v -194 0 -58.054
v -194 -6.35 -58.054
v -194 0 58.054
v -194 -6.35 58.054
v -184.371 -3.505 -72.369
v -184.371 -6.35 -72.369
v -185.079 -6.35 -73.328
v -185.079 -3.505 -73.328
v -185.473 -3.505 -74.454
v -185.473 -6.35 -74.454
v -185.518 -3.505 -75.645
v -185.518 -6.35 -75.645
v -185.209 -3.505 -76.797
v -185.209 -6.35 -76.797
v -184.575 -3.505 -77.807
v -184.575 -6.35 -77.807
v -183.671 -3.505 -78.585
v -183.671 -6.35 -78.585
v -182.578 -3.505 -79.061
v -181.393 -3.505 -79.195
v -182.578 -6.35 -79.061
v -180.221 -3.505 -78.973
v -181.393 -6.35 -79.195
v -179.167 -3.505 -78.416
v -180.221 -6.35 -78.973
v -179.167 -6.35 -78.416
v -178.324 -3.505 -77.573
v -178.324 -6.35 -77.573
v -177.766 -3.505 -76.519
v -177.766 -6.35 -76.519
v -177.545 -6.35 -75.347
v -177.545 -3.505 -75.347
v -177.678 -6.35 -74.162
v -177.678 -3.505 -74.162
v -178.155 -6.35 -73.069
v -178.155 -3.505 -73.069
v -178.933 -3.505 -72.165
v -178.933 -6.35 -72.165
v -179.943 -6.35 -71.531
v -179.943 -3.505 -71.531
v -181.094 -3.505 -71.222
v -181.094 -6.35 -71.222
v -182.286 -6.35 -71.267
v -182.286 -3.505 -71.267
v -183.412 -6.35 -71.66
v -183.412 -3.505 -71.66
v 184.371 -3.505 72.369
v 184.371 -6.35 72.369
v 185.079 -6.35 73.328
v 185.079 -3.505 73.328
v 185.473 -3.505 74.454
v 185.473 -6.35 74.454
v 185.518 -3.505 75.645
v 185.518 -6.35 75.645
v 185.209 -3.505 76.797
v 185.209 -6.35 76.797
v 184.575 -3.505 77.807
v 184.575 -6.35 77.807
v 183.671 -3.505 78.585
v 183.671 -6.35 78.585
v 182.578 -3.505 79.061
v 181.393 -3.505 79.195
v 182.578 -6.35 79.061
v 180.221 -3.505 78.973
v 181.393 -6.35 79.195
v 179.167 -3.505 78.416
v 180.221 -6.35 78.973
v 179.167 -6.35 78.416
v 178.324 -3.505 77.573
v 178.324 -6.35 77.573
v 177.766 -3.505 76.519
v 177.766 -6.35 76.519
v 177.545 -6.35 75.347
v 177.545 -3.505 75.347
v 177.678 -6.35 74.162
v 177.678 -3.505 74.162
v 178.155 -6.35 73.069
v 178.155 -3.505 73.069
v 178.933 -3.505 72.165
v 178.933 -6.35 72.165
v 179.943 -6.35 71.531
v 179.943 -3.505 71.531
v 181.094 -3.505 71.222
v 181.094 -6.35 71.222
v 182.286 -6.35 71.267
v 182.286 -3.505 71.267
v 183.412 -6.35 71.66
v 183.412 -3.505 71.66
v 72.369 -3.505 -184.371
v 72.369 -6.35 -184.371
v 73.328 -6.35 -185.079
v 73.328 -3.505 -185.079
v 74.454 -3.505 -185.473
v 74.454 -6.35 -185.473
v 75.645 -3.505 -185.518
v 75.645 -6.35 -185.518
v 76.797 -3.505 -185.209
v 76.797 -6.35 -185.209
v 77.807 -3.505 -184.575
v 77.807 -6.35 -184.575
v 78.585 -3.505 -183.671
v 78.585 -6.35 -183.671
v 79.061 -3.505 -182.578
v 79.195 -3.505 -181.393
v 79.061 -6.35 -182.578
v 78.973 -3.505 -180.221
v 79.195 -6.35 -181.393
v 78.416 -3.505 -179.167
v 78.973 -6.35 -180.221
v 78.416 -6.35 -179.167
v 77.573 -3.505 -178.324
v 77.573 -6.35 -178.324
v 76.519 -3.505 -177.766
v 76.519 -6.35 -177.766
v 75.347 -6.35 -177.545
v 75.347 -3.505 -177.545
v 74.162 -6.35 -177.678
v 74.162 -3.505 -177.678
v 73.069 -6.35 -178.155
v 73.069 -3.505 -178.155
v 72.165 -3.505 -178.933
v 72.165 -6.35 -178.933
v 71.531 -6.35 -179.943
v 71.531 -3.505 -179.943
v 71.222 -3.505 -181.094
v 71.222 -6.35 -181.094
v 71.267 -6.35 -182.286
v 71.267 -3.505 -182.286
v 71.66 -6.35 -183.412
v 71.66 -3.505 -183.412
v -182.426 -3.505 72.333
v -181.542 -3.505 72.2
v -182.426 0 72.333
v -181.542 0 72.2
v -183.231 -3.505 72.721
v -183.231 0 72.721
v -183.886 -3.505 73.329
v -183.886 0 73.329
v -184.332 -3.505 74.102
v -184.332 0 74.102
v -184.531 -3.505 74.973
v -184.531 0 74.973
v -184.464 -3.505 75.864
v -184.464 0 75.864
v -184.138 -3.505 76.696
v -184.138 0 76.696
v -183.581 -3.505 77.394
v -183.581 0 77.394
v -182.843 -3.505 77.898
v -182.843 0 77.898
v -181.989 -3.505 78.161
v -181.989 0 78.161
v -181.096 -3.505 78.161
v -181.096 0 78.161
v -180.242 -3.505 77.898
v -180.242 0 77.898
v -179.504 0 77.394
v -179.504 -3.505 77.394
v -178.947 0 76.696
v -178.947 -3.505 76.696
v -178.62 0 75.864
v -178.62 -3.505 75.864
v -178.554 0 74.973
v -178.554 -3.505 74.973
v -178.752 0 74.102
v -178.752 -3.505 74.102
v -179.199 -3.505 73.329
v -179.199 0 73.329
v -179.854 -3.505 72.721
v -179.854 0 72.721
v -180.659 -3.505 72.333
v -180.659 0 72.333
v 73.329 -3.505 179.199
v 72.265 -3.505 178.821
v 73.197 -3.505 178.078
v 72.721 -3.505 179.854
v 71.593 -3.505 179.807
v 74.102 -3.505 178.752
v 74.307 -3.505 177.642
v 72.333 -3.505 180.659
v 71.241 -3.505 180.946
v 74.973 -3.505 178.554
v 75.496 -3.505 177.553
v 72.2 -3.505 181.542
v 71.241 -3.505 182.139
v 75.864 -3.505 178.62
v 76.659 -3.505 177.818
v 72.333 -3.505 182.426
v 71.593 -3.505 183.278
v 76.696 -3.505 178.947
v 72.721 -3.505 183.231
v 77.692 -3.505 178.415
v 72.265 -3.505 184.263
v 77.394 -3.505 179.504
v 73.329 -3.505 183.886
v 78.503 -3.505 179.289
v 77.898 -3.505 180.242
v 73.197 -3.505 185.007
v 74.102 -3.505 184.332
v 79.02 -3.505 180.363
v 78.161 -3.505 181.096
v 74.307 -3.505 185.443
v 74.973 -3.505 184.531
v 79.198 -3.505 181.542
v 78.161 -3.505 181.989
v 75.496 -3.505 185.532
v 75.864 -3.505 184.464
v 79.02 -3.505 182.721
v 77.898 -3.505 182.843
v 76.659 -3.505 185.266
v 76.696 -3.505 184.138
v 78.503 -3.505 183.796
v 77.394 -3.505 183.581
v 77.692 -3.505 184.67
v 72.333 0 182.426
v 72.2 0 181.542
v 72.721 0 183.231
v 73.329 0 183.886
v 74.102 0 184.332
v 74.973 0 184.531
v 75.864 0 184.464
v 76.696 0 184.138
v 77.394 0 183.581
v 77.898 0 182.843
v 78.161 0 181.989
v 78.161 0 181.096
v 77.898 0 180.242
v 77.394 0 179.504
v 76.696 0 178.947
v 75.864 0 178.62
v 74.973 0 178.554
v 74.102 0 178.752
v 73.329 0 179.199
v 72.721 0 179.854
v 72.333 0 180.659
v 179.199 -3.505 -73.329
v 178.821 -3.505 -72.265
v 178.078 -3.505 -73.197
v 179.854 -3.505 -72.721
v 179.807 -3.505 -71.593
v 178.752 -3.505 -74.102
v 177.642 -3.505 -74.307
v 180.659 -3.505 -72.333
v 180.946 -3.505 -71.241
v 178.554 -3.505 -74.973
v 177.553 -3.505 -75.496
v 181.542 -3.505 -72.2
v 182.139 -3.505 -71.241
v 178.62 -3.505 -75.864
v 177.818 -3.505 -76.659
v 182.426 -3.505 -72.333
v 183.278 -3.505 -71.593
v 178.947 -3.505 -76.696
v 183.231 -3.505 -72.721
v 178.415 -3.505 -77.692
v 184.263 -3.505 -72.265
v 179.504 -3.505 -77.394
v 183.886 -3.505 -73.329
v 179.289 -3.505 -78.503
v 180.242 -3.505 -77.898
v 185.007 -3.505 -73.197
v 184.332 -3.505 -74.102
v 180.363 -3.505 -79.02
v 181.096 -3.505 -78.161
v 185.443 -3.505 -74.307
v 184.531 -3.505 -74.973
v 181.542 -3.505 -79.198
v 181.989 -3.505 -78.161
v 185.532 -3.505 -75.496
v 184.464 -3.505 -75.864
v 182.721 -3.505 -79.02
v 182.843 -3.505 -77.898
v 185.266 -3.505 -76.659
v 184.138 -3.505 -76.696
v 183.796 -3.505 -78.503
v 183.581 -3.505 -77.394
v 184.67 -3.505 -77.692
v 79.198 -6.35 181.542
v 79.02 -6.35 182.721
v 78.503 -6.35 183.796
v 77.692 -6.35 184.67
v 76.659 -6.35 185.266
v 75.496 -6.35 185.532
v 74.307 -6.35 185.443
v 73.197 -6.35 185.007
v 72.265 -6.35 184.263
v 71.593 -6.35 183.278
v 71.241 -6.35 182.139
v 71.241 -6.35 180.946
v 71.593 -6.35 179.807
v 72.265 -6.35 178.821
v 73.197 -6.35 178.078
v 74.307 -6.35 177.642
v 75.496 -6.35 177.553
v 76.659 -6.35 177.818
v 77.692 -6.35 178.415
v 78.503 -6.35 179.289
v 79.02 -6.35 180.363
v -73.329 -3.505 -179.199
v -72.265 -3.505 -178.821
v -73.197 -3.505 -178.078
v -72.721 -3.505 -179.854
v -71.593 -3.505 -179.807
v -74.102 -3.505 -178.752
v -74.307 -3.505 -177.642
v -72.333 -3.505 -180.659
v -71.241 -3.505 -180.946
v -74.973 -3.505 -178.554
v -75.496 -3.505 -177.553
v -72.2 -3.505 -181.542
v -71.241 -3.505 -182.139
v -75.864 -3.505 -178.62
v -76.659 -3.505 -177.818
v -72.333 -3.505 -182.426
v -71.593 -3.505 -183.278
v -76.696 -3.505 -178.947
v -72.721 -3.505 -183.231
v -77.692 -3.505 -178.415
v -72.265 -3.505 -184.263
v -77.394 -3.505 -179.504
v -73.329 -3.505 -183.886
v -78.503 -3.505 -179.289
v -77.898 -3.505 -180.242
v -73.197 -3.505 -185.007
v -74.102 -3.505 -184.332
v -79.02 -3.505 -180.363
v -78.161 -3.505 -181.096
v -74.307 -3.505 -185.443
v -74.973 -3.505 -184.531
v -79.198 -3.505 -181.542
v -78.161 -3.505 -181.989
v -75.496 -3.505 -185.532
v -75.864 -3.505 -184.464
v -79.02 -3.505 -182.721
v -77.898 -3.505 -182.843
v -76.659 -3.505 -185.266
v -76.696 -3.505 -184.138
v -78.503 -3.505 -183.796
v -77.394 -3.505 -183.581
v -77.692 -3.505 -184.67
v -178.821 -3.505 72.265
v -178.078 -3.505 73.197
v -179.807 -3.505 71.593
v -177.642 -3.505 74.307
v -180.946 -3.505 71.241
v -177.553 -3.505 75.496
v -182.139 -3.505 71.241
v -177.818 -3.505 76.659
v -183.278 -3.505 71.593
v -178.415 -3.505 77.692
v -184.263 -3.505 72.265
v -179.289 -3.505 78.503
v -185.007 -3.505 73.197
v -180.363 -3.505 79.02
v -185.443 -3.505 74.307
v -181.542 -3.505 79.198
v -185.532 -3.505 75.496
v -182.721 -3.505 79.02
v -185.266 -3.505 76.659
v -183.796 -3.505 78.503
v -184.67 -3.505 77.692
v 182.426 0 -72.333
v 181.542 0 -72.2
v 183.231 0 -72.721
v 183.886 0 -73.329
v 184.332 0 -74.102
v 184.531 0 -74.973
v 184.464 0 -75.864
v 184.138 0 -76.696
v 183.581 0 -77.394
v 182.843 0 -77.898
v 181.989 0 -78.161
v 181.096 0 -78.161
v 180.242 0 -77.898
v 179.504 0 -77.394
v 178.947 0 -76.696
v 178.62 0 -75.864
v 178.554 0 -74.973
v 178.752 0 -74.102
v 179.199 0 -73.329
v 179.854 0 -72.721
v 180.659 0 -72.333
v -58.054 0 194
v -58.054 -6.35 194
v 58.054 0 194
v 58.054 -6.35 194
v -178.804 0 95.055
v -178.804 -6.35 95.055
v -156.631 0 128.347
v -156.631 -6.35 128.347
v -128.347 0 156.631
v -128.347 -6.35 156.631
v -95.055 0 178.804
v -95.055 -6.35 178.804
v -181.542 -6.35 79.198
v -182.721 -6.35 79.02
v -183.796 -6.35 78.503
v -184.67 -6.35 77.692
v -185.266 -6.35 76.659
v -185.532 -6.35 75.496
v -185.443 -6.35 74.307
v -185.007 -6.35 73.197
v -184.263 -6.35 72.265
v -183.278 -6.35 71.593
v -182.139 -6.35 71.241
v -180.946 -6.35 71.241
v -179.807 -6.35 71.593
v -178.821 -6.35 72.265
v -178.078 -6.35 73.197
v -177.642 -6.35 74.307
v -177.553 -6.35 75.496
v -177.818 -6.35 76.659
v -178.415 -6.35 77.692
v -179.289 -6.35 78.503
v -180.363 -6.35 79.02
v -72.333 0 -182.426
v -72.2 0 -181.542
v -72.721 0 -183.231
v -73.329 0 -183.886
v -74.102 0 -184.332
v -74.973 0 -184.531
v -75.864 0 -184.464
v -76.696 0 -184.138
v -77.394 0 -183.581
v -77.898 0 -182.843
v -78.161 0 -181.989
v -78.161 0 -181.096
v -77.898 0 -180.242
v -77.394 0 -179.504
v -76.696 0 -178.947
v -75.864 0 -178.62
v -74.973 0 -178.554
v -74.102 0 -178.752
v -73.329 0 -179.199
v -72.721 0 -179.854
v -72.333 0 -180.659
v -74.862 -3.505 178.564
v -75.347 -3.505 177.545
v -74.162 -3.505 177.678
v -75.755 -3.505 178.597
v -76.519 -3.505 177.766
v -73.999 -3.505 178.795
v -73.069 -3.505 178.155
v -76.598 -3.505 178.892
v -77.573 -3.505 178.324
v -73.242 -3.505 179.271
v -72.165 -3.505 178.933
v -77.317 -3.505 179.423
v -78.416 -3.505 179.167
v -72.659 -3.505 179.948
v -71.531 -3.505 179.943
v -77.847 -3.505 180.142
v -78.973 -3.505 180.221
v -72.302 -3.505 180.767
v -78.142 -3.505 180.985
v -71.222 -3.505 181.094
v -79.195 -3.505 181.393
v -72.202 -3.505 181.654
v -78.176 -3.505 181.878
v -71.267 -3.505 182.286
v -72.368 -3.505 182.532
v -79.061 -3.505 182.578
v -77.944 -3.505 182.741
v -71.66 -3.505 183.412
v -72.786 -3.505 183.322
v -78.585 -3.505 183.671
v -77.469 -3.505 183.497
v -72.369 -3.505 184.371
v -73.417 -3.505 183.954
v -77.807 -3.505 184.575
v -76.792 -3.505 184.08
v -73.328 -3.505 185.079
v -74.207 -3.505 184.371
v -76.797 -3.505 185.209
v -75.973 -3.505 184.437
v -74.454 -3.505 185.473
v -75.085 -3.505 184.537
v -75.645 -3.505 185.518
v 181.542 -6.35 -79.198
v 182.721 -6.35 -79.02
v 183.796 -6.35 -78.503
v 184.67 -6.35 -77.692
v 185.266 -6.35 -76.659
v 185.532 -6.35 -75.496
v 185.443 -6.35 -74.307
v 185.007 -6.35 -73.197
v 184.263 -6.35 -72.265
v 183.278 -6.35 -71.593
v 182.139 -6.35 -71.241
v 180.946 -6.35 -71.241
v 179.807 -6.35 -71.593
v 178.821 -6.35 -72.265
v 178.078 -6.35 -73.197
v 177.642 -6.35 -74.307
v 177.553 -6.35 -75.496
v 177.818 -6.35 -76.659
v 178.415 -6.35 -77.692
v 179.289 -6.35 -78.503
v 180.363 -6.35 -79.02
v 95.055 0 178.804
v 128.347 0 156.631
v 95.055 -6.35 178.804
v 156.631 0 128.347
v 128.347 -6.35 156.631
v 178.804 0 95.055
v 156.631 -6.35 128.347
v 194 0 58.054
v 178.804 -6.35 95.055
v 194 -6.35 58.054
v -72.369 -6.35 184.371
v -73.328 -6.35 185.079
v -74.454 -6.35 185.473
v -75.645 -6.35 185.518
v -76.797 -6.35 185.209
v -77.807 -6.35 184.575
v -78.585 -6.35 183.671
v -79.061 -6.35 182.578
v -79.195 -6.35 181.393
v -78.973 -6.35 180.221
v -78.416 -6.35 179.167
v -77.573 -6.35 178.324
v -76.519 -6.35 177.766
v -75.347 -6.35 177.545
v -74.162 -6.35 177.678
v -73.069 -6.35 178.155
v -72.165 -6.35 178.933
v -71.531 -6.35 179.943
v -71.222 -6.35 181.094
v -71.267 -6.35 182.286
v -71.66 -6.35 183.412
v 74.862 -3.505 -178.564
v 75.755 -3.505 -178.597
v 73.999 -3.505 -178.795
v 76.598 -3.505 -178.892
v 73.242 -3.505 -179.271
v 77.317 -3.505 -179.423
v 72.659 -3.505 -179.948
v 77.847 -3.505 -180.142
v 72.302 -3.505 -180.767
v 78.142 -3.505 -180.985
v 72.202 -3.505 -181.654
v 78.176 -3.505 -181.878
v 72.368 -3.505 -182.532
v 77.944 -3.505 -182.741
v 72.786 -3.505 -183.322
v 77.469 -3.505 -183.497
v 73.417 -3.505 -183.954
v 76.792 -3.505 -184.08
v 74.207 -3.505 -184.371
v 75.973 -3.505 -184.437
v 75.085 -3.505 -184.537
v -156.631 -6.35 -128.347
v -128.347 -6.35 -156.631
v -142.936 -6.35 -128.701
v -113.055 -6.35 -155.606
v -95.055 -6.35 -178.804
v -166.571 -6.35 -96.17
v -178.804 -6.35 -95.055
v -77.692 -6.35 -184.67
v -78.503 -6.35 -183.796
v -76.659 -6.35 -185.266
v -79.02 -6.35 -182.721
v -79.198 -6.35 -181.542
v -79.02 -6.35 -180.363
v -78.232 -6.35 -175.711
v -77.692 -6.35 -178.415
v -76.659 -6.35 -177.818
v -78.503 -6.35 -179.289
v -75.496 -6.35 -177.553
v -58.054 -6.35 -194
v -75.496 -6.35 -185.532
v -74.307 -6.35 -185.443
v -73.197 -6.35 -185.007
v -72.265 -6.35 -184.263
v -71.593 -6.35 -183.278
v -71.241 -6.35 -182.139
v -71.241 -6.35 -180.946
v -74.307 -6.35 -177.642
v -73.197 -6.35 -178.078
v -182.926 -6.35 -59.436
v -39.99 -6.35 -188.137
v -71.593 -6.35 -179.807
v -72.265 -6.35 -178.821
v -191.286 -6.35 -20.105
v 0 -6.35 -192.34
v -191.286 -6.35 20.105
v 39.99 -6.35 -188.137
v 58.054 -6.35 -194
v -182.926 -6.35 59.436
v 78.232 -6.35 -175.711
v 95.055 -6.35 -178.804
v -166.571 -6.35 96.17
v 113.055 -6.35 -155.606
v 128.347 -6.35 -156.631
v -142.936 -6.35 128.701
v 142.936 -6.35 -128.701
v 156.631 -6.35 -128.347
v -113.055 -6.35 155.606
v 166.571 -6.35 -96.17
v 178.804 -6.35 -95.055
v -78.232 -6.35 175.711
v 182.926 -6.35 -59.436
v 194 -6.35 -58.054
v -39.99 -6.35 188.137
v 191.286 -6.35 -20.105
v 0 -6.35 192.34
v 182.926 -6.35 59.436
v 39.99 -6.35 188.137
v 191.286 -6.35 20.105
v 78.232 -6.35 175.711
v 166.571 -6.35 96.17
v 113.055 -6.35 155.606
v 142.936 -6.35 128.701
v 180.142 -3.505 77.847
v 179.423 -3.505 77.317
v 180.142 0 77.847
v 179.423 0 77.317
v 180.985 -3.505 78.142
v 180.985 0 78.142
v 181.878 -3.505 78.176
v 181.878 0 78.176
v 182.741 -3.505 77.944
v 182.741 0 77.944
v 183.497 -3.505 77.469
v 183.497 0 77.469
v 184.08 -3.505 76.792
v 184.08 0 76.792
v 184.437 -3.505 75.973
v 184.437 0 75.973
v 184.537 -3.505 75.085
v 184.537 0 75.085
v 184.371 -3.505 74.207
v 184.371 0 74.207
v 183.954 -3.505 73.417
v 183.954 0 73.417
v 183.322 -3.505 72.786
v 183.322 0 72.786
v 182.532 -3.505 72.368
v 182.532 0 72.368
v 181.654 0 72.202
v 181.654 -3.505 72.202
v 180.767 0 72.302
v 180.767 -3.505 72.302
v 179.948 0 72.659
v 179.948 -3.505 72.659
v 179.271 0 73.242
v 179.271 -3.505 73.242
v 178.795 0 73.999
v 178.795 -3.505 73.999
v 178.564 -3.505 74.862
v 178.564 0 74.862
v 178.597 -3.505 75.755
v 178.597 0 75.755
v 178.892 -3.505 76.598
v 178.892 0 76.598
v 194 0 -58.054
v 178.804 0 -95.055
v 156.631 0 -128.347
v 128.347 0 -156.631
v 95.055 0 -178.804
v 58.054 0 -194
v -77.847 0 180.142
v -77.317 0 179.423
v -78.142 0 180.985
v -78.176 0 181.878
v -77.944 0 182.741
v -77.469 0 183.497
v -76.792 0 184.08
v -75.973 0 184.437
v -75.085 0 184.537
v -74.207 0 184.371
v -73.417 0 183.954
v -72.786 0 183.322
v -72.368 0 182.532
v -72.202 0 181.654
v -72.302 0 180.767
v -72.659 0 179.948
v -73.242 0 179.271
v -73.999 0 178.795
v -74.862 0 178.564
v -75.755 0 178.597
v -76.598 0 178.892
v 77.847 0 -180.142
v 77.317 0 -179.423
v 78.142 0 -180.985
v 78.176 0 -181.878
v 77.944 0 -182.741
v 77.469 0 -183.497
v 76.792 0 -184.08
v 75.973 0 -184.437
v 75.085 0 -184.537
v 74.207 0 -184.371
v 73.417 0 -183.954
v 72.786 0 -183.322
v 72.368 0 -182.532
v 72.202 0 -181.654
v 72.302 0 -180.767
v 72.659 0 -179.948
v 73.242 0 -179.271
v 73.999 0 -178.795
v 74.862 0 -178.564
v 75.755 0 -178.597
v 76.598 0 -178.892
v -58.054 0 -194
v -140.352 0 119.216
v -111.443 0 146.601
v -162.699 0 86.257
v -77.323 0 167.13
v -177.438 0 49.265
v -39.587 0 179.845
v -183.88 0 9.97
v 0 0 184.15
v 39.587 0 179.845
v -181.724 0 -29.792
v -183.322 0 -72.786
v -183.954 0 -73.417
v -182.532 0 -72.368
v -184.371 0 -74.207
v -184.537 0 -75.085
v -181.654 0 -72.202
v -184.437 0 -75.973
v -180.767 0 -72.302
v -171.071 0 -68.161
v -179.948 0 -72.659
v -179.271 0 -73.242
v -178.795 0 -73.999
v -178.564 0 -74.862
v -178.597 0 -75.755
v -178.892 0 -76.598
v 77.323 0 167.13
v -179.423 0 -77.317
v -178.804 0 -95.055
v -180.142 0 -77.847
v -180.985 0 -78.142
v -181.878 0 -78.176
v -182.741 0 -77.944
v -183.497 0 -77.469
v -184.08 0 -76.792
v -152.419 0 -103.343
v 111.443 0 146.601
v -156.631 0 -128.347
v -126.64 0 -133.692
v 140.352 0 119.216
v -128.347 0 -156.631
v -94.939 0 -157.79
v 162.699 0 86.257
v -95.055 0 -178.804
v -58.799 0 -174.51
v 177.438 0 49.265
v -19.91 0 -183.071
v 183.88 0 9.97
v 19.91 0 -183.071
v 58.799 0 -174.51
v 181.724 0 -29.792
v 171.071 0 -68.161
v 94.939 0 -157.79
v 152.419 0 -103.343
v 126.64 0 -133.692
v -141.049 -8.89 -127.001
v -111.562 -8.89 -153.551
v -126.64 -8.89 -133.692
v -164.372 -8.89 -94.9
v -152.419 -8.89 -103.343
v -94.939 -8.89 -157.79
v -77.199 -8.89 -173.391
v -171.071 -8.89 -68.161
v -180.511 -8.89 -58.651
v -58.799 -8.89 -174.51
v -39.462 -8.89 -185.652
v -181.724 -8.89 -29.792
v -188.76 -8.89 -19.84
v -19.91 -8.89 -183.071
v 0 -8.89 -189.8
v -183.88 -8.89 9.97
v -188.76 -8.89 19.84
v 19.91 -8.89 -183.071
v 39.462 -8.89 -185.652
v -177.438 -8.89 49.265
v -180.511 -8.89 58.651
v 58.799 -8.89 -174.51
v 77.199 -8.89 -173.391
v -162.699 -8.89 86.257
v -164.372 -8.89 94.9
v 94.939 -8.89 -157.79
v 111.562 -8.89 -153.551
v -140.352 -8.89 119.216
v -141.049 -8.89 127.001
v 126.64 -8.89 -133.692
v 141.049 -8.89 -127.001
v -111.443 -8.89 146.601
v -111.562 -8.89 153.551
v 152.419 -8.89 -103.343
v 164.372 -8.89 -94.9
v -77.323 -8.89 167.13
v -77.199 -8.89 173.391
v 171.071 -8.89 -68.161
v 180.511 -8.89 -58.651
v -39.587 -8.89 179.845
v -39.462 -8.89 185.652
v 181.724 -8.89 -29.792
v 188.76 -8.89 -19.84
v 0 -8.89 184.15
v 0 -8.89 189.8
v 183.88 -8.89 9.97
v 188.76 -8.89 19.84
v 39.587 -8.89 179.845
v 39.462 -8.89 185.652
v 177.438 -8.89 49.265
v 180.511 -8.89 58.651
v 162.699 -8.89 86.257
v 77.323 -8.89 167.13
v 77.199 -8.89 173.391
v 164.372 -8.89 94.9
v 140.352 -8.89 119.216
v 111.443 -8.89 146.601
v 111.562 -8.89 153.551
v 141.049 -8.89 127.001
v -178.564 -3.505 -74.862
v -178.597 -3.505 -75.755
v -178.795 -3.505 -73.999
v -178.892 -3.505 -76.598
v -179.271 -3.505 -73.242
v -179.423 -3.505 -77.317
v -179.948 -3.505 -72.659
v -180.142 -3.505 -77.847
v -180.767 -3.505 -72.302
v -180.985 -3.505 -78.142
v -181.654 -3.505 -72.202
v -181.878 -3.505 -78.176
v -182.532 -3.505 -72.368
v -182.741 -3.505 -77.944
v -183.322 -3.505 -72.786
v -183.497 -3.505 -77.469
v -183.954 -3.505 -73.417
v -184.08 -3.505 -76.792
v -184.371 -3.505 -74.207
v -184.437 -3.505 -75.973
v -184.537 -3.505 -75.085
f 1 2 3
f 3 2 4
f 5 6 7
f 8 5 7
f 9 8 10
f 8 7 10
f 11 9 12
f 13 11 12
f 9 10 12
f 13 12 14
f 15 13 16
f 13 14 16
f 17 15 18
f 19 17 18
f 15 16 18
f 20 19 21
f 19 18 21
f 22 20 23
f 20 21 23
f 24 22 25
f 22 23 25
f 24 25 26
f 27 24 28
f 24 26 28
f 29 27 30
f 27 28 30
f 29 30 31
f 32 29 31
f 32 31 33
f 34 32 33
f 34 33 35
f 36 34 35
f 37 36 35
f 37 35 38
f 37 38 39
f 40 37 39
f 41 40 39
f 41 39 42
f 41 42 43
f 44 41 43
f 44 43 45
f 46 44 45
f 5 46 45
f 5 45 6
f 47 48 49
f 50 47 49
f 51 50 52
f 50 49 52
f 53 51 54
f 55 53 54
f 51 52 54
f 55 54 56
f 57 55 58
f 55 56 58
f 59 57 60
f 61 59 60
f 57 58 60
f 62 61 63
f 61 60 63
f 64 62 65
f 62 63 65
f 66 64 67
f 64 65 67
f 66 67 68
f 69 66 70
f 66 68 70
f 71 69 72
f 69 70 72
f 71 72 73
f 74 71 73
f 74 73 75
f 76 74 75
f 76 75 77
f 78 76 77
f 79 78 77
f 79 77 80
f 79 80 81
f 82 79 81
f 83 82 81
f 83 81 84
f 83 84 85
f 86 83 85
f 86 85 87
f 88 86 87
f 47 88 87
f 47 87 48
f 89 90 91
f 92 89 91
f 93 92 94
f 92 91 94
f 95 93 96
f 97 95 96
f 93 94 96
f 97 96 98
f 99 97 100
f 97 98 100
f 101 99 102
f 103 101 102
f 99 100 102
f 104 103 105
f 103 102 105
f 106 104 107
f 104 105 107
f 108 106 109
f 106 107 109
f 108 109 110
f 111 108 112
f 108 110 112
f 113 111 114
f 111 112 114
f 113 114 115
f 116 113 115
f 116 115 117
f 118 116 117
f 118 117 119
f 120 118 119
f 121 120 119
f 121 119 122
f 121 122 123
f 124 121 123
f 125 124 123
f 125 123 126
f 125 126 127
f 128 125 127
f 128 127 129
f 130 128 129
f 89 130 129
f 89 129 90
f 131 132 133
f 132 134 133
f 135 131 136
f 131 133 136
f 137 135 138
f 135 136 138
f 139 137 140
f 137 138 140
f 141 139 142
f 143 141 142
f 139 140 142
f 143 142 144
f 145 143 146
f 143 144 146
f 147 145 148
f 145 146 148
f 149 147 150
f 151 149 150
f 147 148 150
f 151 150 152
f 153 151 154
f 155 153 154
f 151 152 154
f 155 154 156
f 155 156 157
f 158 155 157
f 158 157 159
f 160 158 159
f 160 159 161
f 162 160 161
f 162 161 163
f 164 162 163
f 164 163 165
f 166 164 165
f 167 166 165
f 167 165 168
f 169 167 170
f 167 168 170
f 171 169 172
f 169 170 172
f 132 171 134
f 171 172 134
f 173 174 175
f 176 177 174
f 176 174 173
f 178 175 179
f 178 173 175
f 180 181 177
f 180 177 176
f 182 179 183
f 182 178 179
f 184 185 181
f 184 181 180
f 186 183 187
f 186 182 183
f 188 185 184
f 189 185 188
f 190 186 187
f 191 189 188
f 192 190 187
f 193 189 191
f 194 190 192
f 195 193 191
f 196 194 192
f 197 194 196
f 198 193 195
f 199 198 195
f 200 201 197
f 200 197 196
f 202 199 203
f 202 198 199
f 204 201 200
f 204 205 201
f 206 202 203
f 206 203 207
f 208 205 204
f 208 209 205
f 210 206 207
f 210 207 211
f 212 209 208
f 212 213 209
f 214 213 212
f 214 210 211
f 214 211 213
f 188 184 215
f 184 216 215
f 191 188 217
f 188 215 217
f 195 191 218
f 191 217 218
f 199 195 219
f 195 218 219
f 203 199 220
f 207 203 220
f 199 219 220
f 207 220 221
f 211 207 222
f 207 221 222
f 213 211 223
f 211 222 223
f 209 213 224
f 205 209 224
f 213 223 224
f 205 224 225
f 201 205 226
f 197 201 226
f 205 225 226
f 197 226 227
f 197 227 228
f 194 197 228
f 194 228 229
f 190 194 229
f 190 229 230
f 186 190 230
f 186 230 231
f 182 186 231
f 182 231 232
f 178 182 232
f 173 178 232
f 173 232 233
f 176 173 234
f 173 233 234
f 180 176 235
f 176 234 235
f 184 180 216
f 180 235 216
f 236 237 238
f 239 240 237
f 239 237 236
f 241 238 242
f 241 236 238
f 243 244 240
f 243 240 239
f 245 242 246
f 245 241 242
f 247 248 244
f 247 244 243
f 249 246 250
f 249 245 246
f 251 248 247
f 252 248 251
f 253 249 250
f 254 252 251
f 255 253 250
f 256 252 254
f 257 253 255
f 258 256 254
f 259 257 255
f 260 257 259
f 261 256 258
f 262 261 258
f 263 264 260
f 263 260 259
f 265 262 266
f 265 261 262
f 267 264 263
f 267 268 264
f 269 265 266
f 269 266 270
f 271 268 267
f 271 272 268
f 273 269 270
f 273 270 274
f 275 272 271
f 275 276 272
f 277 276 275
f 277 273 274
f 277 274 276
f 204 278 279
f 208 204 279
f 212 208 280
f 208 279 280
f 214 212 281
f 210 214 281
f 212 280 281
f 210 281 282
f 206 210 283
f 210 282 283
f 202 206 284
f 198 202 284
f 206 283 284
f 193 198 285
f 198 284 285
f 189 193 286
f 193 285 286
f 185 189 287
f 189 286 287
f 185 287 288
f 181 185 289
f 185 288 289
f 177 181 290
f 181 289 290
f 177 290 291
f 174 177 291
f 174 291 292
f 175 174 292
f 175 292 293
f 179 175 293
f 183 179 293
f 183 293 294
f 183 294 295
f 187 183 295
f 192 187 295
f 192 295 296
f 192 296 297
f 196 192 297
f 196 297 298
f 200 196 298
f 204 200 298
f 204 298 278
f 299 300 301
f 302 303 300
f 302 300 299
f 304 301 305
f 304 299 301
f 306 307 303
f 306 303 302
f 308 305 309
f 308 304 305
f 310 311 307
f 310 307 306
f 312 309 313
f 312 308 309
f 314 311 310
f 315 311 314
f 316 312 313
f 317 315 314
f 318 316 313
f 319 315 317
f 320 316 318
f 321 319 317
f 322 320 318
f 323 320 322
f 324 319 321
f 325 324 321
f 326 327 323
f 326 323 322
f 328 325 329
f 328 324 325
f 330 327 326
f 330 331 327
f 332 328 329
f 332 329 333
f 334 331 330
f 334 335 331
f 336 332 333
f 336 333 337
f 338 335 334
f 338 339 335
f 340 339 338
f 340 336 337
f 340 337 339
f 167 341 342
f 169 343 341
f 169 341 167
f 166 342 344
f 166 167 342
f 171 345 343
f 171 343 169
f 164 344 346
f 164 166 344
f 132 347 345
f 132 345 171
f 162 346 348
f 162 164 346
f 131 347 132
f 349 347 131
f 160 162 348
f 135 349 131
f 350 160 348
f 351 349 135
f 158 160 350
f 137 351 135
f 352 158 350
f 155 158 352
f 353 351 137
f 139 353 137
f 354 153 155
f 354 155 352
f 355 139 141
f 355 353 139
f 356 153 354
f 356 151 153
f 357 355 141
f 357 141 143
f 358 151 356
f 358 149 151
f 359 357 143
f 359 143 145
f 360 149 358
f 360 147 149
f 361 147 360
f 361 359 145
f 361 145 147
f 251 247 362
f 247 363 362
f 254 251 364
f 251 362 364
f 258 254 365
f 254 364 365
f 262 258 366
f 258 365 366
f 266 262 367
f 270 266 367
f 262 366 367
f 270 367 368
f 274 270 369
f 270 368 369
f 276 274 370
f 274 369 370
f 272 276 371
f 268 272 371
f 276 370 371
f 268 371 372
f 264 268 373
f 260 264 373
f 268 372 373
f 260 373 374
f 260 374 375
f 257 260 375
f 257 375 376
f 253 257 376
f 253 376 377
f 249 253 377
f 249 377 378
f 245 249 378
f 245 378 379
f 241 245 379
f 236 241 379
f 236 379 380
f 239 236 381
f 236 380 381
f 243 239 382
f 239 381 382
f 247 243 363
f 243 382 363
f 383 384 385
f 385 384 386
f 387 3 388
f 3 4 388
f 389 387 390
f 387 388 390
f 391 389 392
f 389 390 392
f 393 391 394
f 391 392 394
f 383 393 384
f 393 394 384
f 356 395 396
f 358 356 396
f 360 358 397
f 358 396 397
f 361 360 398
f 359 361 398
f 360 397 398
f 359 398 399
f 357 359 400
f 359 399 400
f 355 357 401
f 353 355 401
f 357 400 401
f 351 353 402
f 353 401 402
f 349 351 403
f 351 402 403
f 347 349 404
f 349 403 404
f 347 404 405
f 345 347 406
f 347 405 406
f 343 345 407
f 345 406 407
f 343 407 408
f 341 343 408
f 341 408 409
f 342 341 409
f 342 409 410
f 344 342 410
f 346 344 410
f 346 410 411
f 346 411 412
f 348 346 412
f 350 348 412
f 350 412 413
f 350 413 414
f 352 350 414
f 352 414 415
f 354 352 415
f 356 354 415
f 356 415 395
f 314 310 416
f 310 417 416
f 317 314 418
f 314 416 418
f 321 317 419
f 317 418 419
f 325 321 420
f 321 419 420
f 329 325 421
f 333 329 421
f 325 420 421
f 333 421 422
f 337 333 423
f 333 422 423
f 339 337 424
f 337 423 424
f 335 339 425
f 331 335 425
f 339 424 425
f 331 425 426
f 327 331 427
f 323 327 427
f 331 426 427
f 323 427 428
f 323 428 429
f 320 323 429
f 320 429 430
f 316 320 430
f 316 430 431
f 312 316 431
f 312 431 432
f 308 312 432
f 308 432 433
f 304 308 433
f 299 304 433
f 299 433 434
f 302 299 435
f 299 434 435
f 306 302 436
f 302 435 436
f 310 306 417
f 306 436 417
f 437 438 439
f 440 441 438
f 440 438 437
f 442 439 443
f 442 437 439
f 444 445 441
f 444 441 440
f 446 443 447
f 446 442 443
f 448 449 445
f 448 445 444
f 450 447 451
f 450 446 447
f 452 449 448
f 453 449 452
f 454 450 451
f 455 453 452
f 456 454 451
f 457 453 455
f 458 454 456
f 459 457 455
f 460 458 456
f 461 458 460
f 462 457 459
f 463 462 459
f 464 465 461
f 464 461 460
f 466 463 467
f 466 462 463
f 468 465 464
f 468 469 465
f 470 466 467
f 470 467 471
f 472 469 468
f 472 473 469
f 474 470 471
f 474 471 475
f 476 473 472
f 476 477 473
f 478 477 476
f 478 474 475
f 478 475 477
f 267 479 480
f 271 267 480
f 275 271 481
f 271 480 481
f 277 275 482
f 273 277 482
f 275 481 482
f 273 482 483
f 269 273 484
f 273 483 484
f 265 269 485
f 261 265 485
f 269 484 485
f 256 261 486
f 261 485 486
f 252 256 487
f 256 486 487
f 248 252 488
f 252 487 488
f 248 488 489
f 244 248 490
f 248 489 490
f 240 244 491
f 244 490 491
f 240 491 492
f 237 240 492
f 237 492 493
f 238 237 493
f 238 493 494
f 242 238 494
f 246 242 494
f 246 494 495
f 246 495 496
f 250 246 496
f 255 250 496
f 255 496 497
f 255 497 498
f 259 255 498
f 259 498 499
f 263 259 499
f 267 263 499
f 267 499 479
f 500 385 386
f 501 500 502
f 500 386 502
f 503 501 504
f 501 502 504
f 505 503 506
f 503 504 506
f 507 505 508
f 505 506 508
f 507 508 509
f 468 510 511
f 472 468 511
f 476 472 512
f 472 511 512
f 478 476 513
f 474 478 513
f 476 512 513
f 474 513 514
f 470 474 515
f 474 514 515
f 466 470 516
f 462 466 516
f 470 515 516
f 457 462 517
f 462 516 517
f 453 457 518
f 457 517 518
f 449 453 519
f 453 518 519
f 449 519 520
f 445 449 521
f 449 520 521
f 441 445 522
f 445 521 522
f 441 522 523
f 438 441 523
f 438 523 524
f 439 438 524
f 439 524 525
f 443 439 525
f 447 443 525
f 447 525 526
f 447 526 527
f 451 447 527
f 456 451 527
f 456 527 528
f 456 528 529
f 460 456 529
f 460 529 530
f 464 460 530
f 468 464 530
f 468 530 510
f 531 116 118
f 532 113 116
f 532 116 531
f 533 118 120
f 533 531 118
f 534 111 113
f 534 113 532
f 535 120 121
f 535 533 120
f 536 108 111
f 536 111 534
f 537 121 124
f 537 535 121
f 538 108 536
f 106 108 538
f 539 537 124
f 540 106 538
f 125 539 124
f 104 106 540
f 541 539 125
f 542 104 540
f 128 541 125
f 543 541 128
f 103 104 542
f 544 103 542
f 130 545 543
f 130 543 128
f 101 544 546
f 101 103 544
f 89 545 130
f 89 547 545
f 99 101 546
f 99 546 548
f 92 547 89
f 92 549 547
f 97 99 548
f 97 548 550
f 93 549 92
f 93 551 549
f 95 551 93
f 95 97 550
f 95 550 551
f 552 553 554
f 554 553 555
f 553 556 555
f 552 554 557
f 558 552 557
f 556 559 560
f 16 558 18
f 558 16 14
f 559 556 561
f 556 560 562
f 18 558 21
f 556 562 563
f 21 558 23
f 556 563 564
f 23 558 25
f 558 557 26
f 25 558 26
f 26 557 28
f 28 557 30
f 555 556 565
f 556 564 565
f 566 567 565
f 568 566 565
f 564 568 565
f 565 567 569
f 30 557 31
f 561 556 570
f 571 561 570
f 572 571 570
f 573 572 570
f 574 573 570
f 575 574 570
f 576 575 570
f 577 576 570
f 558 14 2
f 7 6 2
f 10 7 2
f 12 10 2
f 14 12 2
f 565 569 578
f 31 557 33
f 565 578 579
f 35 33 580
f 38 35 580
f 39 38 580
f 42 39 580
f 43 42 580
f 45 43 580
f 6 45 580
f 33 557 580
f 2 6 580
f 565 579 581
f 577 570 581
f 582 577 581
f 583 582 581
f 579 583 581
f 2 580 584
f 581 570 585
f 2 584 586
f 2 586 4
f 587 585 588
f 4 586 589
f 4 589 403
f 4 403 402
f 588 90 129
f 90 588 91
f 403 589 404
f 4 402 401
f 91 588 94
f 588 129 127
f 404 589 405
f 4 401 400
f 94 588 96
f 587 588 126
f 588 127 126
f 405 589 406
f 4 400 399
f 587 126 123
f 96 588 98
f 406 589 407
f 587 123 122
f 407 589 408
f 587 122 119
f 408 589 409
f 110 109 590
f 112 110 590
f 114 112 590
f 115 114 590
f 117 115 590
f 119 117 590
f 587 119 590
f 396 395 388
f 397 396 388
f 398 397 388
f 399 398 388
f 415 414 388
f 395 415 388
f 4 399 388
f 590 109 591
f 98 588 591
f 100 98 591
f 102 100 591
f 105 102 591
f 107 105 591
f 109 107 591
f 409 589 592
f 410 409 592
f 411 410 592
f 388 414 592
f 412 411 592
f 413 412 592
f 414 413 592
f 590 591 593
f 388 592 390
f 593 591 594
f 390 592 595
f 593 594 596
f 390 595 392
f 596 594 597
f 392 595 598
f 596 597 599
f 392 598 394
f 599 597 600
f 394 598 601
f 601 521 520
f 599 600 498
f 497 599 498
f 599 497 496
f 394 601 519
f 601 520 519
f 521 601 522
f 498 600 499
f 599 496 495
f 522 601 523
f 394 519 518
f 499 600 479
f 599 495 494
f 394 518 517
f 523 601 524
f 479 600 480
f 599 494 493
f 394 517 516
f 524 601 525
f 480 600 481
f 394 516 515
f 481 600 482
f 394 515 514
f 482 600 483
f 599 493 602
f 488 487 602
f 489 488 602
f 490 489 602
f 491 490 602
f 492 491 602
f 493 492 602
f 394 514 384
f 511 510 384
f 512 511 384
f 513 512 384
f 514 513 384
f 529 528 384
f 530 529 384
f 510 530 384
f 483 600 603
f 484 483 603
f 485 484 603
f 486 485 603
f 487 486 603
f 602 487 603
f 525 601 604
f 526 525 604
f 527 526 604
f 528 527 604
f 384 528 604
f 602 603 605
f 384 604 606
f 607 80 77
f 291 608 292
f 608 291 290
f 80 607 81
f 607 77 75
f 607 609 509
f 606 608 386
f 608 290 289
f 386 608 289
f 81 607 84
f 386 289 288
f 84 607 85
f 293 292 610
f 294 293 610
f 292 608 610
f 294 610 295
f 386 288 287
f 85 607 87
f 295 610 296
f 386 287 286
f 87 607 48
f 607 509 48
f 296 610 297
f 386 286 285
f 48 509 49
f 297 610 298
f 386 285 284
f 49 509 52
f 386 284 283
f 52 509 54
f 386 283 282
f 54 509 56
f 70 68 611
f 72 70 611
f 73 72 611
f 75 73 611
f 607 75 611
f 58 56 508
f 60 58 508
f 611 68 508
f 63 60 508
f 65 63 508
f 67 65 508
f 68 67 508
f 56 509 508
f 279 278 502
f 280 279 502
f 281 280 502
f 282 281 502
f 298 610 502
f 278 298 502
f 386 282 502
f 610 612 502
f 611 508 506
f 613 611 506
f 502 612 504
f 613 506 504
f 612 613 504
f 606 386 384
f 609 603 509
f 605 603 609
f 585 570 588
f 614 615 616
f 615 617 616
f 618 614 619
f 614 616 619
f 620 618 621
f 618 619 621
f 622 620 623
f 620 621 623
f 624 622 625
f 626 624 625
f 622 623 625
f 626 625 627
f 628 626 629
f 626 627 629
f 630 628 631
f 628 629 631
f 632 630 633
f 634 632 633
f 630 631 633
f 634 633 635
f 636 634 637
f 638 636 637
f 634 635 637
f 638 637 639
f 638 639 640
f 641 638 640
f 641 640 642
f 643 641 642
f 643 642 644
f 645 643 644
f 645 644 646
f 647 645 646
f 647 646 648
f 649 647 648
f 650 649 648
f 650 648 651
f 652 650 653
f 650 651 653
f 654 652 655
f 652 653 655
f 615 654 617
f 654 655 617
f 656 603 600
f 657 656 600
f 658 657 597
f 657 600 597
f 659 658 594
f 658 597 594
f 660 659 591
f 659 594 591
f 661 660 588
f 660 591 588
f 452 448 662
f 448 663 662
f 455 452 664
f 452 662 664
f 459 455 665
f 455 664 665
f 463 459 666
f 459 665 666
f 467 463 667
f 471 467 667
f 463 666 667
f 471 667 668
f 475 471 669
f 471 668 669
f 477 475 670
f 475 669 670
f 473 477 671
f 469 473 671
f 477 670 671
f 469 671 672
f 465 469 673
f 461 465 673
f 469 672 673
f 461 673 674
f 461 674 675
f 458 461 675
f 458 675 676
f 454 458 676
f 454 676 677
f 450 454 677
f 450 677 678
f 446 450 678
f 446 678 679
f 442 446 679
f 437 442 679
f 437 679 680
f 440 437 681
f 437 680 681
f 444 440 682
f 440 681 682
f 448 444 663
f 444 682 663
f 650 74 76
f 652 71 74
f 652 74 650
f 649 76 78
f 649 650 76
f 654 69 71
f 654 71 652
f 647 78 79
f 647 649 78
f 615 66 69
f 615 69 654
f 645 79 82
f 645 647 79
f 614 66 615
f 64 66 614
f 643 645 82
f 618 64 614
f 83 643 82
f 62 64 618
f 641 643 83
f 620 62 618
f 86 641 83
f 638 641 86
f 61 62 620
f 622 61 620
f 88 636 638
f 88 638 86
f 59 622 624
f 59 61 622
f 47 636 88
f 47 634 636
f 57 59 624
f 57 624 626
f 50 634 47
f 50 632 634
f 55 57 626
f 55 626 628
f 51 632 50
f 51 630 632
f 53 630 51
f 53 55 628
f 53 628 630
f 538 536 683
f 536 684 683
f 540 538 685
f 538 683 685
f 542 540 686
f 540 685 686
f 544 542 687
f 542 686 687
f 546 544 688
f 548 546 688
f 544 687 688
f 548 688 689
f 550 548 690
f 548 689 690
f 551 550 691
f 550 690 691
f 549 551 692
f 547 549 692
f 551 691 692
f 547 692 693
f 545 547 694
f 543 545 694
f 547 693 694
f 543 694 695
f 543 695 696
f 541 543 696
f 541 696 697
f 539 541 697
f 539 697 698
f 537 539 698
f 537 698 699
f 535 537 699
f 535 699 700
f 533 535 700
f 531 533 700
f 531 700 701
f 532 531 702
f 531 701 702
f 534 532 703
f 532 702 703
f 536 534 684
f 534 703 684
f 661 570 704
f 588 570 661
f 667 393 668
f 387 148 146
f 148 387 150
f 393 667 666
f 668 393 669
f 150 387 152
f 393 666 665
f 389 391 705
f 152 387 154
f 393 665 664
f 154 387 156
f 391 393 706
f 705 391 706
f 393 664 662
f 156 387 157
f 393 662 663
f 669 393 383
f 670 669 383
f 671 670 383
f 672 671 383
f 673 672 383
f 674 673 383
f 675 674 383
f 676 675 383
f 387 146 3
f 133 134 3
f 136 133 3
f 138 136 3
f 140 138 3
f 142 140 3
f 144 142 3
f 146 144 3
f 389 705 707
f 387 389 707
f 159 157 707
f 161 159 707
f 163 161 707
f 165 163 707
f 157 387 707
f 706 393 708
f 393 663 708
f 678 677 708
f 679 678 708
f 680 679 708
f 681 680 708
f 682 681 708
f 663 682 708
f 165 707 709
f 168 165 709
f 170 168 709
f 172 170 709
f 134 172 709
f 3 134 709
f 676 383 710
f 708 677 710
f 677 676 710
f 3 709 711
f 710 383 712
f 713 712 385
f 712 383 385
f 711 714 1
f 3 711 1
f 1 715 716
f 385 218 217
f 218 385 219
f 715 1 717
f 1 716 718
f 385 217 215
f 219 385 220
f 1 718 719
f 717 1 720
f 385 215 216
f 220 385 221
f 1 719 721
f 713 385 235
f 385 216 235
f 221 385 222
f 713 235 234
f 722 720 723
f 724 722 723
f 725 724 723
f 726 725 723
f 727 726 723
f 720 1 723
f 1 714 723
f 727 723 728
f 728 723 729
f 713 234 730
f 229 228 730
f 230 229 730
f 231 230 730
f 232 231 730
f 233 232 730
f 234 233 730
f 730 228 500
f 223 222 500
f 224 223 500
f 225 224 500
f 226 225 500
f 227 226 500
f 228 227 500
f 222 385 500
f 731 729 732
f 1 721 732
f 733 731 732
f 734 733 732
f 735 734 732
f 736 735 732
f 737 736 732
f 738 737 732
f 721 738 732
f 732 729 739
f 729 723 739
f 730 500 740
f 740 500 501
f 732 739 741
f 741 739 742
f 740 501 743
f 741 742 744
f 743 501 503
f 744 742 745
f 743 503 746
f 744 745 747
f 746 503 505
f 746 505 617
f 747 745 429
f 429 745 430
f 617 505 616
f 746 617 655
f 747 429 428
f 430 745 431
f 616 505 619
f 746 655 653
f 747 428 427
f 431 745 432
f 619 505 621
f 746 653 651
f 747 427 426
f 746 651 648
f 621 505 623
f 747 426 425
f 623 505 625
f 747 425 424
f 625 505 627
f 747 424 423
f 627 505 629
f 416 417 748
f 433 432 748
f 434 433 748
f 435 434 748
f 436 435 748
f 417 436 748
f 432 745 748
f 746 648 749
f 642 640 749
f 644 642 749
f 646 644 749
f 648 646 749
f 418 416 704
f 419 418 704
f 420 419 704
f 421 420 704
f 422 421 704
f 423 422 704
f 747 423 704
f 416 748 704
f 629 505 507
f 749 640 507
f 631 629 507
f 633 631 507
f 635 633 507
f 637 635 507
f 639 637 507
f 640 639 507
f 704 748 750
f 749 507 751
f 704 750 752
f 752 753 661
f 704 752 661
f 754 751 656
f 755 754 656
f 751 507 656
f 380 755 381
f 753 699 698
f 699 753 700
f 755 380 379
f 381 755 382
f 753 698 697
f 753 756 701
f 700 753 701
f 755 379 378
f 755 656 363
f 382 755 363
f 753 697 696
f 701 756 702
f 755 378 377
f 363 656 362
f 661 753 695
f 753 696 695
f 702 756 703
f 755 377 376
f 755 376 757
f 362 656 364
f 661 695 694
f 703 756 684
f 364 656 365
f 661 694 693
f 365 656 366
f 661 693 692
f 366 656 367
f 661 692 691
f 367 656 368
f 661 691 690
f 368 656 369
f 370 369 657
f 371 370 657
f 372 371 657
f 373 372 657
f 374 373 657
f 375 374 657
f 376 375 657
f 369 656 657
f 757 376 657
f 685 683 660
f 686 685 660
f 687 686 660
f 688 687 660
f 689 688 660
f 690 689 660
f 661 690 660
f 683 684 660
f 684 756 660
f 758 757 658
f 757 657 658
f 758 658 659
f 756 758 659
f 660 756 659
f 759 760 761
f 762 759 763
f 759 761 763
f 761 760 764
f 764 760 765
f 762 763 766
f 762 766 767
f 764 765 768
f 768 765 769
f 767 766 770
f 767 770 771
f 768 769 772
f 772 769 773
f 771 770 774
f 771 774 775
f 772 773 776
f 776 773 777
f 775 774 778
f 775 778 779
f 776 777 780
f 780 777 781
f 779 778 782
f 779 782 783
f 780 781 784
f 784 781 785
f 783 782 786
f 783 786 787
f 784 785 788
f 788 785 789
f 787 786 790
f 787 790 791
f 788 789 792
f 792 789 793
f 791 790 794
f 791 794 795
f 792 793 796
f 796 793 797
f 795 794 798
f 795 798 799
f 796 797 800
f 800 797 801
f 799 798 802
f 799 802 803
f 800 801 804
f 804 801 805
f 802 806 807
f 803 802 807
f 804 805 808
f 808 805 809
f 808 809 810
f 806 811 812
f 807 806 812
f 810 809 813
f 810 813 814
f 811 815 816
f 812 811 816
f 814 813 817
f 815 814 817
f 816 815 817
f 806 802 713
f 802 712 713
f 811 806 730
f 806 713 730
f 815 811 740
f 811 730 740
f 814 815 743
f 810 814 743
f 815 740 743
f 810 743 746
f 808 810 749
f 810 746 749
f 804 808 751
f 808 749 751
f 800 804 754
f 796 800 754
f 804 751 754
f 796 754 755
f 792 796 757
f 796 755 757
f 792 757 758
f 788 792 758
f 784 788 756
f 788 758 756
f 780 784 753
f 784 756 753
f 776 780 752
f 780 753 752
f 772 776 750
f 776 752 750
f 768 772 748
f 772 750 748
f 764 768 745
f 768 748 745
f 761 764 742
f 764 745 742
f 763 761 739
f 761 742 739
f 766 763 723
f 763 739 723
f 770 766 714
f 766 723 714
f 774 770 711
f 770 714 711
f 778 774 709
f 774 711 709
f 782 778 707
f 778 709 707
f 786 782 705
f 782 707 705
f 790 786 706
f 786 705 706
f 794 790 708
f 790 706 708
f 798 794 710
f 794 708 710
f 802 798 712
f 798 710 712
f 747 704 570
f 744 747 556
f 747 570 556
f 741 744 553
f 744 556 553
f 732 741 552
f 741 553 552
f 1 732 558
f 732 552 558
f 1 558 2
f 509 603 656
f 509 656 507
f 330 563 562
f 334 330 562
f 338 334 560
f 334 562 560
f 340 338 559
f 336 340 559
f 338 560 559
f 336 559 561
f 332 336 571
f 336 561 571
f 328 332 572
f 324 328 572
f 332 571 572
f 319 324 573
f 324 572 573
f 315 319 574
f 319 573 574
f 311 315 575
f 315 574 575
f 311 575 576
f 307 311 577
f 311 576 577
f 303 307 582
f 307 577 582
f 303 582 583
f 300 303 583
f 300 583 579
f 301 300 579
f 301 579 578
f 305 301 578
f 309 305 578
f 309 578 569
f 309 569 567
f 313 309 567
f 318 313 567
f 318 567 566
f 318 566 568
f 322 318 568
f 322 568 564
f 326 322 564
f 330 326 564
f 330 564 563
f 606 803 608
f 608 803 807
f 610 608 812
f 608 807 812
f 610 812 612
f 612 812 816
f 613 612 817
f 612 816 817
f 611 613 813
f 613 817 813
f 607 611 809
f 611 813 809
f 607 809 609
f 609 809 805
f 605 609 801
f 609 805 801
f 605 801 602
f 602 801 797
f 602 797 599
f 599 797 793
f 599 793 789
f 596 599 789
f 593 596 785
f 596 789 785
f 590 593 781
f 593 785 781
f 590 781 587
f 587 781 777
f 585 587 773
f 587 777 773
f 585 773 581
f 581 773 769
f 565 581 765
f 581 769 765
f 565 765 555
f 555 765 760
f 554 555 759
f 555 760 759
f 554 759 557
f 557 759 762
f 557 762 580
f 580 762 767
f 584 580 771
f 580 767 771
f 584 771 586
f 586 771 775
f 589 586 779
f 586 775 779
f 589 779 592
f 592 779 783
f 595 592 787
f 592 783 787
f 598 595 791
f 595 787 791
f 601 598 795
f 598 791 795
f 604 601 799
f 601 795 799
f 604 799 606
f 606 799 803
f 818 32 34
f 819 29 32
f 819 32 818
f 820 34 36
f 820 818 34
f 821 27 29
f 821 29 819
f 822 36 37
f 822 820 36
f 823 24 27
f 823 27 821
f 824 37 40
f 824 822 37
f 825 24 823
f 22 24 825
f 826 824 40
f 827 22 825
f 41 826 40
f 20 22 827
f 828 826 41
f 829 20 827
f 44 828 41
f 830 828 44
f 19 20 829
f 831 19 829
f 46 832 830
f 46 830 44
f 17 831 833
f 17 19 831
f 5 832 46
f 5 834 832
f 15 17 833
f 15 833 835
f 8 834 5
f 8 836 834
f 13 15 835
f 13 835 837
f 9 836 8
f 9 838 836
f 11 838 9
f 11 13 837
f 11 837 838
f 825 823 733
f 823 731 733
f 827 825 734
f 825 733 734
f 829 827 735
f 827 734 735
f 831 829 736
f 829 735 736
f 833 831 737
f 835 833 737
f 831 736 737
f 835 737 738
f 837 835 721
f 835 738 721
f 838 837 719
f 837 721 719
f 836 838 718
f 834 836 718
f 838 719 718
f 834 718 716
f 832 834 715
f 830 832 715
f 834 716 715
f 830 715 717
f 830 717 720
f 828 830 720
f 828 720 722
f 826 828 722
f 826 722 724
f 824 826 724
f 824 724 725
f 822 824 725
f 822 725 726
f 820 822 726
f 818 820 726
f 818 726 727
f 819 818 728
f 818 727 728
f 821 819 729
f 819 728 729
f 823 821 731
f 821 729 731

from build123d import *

# Parameters (mm, degrees)
F3_D            = 5.9944
F3_DEPTH        = 25.4
F3_CBORE_D      = 8.001
F3_CBORE_DEPTH  = 2.8448
F3_TIP          = 1.8008994473
F3_COPIES_COUNT = 8
F4_R            = 365.4109378698
F4_W            = 388
F4_H            = 388
F5_DEPTH        = 6.351


# Not quite as in the source:
# - a pattern or mirror of a feature is missing from the dataset's text; its kind, count and spacing are read off the source's solid


with BuildPart() as f1:
    # F0 (on Right) → F1 (revolve)
    with BuildSketch(Plane.YZ):
        Polygon((-8.89, 184.15), (0, 184.15), (0, 202.5), (-6.35, 202.5), (-6.35, 192.34), (-8.89, 189.8), align=None)
    revolve(axis=Axis((0, 77.3353951023, 0), (0, 1, 0)))

    # F3
    with Locations(Plane.XZ.offset(6.35)):
        with Locations((75.1972944597, 181.5423281385)):
            f3 = CounterBoreHole(F3_D / 2, F3_CBORE_D / 2, F3_CBORE_DEPTH, depth=F3_DEPTH)
            with Locations((0, 0, -(F3_DEPTH + F3_TIP / 2))):  # 118° drill point
                Cone(0, F3_D / 2, F3_TIP, mode=Mode.SUBTRACT)

    # F3_copies: F3 ×8 about axis
    f3_copies_axis = Axis((0, 0, 0), (0, 1, 0))
    for i in range(1, F3_COPIES_COUNT):
        add(f3.rotate(f3_copies_axis, i * 360 / F3_COPIES_COUNT), mode=Mode.SUBTRACT)

    # F4 (on face) → F5 (cut, through all)
    with BuildSketch(Plane.XZ.offset(6.35)):
        Circle(F4_R)
        Rectangle(F4_W, F4_H, mode=Mode.SUBTRACT)
    extrude(amount=-F5_DEPTH, mode=Mode.SUBTRACT)


solid = f1.part
